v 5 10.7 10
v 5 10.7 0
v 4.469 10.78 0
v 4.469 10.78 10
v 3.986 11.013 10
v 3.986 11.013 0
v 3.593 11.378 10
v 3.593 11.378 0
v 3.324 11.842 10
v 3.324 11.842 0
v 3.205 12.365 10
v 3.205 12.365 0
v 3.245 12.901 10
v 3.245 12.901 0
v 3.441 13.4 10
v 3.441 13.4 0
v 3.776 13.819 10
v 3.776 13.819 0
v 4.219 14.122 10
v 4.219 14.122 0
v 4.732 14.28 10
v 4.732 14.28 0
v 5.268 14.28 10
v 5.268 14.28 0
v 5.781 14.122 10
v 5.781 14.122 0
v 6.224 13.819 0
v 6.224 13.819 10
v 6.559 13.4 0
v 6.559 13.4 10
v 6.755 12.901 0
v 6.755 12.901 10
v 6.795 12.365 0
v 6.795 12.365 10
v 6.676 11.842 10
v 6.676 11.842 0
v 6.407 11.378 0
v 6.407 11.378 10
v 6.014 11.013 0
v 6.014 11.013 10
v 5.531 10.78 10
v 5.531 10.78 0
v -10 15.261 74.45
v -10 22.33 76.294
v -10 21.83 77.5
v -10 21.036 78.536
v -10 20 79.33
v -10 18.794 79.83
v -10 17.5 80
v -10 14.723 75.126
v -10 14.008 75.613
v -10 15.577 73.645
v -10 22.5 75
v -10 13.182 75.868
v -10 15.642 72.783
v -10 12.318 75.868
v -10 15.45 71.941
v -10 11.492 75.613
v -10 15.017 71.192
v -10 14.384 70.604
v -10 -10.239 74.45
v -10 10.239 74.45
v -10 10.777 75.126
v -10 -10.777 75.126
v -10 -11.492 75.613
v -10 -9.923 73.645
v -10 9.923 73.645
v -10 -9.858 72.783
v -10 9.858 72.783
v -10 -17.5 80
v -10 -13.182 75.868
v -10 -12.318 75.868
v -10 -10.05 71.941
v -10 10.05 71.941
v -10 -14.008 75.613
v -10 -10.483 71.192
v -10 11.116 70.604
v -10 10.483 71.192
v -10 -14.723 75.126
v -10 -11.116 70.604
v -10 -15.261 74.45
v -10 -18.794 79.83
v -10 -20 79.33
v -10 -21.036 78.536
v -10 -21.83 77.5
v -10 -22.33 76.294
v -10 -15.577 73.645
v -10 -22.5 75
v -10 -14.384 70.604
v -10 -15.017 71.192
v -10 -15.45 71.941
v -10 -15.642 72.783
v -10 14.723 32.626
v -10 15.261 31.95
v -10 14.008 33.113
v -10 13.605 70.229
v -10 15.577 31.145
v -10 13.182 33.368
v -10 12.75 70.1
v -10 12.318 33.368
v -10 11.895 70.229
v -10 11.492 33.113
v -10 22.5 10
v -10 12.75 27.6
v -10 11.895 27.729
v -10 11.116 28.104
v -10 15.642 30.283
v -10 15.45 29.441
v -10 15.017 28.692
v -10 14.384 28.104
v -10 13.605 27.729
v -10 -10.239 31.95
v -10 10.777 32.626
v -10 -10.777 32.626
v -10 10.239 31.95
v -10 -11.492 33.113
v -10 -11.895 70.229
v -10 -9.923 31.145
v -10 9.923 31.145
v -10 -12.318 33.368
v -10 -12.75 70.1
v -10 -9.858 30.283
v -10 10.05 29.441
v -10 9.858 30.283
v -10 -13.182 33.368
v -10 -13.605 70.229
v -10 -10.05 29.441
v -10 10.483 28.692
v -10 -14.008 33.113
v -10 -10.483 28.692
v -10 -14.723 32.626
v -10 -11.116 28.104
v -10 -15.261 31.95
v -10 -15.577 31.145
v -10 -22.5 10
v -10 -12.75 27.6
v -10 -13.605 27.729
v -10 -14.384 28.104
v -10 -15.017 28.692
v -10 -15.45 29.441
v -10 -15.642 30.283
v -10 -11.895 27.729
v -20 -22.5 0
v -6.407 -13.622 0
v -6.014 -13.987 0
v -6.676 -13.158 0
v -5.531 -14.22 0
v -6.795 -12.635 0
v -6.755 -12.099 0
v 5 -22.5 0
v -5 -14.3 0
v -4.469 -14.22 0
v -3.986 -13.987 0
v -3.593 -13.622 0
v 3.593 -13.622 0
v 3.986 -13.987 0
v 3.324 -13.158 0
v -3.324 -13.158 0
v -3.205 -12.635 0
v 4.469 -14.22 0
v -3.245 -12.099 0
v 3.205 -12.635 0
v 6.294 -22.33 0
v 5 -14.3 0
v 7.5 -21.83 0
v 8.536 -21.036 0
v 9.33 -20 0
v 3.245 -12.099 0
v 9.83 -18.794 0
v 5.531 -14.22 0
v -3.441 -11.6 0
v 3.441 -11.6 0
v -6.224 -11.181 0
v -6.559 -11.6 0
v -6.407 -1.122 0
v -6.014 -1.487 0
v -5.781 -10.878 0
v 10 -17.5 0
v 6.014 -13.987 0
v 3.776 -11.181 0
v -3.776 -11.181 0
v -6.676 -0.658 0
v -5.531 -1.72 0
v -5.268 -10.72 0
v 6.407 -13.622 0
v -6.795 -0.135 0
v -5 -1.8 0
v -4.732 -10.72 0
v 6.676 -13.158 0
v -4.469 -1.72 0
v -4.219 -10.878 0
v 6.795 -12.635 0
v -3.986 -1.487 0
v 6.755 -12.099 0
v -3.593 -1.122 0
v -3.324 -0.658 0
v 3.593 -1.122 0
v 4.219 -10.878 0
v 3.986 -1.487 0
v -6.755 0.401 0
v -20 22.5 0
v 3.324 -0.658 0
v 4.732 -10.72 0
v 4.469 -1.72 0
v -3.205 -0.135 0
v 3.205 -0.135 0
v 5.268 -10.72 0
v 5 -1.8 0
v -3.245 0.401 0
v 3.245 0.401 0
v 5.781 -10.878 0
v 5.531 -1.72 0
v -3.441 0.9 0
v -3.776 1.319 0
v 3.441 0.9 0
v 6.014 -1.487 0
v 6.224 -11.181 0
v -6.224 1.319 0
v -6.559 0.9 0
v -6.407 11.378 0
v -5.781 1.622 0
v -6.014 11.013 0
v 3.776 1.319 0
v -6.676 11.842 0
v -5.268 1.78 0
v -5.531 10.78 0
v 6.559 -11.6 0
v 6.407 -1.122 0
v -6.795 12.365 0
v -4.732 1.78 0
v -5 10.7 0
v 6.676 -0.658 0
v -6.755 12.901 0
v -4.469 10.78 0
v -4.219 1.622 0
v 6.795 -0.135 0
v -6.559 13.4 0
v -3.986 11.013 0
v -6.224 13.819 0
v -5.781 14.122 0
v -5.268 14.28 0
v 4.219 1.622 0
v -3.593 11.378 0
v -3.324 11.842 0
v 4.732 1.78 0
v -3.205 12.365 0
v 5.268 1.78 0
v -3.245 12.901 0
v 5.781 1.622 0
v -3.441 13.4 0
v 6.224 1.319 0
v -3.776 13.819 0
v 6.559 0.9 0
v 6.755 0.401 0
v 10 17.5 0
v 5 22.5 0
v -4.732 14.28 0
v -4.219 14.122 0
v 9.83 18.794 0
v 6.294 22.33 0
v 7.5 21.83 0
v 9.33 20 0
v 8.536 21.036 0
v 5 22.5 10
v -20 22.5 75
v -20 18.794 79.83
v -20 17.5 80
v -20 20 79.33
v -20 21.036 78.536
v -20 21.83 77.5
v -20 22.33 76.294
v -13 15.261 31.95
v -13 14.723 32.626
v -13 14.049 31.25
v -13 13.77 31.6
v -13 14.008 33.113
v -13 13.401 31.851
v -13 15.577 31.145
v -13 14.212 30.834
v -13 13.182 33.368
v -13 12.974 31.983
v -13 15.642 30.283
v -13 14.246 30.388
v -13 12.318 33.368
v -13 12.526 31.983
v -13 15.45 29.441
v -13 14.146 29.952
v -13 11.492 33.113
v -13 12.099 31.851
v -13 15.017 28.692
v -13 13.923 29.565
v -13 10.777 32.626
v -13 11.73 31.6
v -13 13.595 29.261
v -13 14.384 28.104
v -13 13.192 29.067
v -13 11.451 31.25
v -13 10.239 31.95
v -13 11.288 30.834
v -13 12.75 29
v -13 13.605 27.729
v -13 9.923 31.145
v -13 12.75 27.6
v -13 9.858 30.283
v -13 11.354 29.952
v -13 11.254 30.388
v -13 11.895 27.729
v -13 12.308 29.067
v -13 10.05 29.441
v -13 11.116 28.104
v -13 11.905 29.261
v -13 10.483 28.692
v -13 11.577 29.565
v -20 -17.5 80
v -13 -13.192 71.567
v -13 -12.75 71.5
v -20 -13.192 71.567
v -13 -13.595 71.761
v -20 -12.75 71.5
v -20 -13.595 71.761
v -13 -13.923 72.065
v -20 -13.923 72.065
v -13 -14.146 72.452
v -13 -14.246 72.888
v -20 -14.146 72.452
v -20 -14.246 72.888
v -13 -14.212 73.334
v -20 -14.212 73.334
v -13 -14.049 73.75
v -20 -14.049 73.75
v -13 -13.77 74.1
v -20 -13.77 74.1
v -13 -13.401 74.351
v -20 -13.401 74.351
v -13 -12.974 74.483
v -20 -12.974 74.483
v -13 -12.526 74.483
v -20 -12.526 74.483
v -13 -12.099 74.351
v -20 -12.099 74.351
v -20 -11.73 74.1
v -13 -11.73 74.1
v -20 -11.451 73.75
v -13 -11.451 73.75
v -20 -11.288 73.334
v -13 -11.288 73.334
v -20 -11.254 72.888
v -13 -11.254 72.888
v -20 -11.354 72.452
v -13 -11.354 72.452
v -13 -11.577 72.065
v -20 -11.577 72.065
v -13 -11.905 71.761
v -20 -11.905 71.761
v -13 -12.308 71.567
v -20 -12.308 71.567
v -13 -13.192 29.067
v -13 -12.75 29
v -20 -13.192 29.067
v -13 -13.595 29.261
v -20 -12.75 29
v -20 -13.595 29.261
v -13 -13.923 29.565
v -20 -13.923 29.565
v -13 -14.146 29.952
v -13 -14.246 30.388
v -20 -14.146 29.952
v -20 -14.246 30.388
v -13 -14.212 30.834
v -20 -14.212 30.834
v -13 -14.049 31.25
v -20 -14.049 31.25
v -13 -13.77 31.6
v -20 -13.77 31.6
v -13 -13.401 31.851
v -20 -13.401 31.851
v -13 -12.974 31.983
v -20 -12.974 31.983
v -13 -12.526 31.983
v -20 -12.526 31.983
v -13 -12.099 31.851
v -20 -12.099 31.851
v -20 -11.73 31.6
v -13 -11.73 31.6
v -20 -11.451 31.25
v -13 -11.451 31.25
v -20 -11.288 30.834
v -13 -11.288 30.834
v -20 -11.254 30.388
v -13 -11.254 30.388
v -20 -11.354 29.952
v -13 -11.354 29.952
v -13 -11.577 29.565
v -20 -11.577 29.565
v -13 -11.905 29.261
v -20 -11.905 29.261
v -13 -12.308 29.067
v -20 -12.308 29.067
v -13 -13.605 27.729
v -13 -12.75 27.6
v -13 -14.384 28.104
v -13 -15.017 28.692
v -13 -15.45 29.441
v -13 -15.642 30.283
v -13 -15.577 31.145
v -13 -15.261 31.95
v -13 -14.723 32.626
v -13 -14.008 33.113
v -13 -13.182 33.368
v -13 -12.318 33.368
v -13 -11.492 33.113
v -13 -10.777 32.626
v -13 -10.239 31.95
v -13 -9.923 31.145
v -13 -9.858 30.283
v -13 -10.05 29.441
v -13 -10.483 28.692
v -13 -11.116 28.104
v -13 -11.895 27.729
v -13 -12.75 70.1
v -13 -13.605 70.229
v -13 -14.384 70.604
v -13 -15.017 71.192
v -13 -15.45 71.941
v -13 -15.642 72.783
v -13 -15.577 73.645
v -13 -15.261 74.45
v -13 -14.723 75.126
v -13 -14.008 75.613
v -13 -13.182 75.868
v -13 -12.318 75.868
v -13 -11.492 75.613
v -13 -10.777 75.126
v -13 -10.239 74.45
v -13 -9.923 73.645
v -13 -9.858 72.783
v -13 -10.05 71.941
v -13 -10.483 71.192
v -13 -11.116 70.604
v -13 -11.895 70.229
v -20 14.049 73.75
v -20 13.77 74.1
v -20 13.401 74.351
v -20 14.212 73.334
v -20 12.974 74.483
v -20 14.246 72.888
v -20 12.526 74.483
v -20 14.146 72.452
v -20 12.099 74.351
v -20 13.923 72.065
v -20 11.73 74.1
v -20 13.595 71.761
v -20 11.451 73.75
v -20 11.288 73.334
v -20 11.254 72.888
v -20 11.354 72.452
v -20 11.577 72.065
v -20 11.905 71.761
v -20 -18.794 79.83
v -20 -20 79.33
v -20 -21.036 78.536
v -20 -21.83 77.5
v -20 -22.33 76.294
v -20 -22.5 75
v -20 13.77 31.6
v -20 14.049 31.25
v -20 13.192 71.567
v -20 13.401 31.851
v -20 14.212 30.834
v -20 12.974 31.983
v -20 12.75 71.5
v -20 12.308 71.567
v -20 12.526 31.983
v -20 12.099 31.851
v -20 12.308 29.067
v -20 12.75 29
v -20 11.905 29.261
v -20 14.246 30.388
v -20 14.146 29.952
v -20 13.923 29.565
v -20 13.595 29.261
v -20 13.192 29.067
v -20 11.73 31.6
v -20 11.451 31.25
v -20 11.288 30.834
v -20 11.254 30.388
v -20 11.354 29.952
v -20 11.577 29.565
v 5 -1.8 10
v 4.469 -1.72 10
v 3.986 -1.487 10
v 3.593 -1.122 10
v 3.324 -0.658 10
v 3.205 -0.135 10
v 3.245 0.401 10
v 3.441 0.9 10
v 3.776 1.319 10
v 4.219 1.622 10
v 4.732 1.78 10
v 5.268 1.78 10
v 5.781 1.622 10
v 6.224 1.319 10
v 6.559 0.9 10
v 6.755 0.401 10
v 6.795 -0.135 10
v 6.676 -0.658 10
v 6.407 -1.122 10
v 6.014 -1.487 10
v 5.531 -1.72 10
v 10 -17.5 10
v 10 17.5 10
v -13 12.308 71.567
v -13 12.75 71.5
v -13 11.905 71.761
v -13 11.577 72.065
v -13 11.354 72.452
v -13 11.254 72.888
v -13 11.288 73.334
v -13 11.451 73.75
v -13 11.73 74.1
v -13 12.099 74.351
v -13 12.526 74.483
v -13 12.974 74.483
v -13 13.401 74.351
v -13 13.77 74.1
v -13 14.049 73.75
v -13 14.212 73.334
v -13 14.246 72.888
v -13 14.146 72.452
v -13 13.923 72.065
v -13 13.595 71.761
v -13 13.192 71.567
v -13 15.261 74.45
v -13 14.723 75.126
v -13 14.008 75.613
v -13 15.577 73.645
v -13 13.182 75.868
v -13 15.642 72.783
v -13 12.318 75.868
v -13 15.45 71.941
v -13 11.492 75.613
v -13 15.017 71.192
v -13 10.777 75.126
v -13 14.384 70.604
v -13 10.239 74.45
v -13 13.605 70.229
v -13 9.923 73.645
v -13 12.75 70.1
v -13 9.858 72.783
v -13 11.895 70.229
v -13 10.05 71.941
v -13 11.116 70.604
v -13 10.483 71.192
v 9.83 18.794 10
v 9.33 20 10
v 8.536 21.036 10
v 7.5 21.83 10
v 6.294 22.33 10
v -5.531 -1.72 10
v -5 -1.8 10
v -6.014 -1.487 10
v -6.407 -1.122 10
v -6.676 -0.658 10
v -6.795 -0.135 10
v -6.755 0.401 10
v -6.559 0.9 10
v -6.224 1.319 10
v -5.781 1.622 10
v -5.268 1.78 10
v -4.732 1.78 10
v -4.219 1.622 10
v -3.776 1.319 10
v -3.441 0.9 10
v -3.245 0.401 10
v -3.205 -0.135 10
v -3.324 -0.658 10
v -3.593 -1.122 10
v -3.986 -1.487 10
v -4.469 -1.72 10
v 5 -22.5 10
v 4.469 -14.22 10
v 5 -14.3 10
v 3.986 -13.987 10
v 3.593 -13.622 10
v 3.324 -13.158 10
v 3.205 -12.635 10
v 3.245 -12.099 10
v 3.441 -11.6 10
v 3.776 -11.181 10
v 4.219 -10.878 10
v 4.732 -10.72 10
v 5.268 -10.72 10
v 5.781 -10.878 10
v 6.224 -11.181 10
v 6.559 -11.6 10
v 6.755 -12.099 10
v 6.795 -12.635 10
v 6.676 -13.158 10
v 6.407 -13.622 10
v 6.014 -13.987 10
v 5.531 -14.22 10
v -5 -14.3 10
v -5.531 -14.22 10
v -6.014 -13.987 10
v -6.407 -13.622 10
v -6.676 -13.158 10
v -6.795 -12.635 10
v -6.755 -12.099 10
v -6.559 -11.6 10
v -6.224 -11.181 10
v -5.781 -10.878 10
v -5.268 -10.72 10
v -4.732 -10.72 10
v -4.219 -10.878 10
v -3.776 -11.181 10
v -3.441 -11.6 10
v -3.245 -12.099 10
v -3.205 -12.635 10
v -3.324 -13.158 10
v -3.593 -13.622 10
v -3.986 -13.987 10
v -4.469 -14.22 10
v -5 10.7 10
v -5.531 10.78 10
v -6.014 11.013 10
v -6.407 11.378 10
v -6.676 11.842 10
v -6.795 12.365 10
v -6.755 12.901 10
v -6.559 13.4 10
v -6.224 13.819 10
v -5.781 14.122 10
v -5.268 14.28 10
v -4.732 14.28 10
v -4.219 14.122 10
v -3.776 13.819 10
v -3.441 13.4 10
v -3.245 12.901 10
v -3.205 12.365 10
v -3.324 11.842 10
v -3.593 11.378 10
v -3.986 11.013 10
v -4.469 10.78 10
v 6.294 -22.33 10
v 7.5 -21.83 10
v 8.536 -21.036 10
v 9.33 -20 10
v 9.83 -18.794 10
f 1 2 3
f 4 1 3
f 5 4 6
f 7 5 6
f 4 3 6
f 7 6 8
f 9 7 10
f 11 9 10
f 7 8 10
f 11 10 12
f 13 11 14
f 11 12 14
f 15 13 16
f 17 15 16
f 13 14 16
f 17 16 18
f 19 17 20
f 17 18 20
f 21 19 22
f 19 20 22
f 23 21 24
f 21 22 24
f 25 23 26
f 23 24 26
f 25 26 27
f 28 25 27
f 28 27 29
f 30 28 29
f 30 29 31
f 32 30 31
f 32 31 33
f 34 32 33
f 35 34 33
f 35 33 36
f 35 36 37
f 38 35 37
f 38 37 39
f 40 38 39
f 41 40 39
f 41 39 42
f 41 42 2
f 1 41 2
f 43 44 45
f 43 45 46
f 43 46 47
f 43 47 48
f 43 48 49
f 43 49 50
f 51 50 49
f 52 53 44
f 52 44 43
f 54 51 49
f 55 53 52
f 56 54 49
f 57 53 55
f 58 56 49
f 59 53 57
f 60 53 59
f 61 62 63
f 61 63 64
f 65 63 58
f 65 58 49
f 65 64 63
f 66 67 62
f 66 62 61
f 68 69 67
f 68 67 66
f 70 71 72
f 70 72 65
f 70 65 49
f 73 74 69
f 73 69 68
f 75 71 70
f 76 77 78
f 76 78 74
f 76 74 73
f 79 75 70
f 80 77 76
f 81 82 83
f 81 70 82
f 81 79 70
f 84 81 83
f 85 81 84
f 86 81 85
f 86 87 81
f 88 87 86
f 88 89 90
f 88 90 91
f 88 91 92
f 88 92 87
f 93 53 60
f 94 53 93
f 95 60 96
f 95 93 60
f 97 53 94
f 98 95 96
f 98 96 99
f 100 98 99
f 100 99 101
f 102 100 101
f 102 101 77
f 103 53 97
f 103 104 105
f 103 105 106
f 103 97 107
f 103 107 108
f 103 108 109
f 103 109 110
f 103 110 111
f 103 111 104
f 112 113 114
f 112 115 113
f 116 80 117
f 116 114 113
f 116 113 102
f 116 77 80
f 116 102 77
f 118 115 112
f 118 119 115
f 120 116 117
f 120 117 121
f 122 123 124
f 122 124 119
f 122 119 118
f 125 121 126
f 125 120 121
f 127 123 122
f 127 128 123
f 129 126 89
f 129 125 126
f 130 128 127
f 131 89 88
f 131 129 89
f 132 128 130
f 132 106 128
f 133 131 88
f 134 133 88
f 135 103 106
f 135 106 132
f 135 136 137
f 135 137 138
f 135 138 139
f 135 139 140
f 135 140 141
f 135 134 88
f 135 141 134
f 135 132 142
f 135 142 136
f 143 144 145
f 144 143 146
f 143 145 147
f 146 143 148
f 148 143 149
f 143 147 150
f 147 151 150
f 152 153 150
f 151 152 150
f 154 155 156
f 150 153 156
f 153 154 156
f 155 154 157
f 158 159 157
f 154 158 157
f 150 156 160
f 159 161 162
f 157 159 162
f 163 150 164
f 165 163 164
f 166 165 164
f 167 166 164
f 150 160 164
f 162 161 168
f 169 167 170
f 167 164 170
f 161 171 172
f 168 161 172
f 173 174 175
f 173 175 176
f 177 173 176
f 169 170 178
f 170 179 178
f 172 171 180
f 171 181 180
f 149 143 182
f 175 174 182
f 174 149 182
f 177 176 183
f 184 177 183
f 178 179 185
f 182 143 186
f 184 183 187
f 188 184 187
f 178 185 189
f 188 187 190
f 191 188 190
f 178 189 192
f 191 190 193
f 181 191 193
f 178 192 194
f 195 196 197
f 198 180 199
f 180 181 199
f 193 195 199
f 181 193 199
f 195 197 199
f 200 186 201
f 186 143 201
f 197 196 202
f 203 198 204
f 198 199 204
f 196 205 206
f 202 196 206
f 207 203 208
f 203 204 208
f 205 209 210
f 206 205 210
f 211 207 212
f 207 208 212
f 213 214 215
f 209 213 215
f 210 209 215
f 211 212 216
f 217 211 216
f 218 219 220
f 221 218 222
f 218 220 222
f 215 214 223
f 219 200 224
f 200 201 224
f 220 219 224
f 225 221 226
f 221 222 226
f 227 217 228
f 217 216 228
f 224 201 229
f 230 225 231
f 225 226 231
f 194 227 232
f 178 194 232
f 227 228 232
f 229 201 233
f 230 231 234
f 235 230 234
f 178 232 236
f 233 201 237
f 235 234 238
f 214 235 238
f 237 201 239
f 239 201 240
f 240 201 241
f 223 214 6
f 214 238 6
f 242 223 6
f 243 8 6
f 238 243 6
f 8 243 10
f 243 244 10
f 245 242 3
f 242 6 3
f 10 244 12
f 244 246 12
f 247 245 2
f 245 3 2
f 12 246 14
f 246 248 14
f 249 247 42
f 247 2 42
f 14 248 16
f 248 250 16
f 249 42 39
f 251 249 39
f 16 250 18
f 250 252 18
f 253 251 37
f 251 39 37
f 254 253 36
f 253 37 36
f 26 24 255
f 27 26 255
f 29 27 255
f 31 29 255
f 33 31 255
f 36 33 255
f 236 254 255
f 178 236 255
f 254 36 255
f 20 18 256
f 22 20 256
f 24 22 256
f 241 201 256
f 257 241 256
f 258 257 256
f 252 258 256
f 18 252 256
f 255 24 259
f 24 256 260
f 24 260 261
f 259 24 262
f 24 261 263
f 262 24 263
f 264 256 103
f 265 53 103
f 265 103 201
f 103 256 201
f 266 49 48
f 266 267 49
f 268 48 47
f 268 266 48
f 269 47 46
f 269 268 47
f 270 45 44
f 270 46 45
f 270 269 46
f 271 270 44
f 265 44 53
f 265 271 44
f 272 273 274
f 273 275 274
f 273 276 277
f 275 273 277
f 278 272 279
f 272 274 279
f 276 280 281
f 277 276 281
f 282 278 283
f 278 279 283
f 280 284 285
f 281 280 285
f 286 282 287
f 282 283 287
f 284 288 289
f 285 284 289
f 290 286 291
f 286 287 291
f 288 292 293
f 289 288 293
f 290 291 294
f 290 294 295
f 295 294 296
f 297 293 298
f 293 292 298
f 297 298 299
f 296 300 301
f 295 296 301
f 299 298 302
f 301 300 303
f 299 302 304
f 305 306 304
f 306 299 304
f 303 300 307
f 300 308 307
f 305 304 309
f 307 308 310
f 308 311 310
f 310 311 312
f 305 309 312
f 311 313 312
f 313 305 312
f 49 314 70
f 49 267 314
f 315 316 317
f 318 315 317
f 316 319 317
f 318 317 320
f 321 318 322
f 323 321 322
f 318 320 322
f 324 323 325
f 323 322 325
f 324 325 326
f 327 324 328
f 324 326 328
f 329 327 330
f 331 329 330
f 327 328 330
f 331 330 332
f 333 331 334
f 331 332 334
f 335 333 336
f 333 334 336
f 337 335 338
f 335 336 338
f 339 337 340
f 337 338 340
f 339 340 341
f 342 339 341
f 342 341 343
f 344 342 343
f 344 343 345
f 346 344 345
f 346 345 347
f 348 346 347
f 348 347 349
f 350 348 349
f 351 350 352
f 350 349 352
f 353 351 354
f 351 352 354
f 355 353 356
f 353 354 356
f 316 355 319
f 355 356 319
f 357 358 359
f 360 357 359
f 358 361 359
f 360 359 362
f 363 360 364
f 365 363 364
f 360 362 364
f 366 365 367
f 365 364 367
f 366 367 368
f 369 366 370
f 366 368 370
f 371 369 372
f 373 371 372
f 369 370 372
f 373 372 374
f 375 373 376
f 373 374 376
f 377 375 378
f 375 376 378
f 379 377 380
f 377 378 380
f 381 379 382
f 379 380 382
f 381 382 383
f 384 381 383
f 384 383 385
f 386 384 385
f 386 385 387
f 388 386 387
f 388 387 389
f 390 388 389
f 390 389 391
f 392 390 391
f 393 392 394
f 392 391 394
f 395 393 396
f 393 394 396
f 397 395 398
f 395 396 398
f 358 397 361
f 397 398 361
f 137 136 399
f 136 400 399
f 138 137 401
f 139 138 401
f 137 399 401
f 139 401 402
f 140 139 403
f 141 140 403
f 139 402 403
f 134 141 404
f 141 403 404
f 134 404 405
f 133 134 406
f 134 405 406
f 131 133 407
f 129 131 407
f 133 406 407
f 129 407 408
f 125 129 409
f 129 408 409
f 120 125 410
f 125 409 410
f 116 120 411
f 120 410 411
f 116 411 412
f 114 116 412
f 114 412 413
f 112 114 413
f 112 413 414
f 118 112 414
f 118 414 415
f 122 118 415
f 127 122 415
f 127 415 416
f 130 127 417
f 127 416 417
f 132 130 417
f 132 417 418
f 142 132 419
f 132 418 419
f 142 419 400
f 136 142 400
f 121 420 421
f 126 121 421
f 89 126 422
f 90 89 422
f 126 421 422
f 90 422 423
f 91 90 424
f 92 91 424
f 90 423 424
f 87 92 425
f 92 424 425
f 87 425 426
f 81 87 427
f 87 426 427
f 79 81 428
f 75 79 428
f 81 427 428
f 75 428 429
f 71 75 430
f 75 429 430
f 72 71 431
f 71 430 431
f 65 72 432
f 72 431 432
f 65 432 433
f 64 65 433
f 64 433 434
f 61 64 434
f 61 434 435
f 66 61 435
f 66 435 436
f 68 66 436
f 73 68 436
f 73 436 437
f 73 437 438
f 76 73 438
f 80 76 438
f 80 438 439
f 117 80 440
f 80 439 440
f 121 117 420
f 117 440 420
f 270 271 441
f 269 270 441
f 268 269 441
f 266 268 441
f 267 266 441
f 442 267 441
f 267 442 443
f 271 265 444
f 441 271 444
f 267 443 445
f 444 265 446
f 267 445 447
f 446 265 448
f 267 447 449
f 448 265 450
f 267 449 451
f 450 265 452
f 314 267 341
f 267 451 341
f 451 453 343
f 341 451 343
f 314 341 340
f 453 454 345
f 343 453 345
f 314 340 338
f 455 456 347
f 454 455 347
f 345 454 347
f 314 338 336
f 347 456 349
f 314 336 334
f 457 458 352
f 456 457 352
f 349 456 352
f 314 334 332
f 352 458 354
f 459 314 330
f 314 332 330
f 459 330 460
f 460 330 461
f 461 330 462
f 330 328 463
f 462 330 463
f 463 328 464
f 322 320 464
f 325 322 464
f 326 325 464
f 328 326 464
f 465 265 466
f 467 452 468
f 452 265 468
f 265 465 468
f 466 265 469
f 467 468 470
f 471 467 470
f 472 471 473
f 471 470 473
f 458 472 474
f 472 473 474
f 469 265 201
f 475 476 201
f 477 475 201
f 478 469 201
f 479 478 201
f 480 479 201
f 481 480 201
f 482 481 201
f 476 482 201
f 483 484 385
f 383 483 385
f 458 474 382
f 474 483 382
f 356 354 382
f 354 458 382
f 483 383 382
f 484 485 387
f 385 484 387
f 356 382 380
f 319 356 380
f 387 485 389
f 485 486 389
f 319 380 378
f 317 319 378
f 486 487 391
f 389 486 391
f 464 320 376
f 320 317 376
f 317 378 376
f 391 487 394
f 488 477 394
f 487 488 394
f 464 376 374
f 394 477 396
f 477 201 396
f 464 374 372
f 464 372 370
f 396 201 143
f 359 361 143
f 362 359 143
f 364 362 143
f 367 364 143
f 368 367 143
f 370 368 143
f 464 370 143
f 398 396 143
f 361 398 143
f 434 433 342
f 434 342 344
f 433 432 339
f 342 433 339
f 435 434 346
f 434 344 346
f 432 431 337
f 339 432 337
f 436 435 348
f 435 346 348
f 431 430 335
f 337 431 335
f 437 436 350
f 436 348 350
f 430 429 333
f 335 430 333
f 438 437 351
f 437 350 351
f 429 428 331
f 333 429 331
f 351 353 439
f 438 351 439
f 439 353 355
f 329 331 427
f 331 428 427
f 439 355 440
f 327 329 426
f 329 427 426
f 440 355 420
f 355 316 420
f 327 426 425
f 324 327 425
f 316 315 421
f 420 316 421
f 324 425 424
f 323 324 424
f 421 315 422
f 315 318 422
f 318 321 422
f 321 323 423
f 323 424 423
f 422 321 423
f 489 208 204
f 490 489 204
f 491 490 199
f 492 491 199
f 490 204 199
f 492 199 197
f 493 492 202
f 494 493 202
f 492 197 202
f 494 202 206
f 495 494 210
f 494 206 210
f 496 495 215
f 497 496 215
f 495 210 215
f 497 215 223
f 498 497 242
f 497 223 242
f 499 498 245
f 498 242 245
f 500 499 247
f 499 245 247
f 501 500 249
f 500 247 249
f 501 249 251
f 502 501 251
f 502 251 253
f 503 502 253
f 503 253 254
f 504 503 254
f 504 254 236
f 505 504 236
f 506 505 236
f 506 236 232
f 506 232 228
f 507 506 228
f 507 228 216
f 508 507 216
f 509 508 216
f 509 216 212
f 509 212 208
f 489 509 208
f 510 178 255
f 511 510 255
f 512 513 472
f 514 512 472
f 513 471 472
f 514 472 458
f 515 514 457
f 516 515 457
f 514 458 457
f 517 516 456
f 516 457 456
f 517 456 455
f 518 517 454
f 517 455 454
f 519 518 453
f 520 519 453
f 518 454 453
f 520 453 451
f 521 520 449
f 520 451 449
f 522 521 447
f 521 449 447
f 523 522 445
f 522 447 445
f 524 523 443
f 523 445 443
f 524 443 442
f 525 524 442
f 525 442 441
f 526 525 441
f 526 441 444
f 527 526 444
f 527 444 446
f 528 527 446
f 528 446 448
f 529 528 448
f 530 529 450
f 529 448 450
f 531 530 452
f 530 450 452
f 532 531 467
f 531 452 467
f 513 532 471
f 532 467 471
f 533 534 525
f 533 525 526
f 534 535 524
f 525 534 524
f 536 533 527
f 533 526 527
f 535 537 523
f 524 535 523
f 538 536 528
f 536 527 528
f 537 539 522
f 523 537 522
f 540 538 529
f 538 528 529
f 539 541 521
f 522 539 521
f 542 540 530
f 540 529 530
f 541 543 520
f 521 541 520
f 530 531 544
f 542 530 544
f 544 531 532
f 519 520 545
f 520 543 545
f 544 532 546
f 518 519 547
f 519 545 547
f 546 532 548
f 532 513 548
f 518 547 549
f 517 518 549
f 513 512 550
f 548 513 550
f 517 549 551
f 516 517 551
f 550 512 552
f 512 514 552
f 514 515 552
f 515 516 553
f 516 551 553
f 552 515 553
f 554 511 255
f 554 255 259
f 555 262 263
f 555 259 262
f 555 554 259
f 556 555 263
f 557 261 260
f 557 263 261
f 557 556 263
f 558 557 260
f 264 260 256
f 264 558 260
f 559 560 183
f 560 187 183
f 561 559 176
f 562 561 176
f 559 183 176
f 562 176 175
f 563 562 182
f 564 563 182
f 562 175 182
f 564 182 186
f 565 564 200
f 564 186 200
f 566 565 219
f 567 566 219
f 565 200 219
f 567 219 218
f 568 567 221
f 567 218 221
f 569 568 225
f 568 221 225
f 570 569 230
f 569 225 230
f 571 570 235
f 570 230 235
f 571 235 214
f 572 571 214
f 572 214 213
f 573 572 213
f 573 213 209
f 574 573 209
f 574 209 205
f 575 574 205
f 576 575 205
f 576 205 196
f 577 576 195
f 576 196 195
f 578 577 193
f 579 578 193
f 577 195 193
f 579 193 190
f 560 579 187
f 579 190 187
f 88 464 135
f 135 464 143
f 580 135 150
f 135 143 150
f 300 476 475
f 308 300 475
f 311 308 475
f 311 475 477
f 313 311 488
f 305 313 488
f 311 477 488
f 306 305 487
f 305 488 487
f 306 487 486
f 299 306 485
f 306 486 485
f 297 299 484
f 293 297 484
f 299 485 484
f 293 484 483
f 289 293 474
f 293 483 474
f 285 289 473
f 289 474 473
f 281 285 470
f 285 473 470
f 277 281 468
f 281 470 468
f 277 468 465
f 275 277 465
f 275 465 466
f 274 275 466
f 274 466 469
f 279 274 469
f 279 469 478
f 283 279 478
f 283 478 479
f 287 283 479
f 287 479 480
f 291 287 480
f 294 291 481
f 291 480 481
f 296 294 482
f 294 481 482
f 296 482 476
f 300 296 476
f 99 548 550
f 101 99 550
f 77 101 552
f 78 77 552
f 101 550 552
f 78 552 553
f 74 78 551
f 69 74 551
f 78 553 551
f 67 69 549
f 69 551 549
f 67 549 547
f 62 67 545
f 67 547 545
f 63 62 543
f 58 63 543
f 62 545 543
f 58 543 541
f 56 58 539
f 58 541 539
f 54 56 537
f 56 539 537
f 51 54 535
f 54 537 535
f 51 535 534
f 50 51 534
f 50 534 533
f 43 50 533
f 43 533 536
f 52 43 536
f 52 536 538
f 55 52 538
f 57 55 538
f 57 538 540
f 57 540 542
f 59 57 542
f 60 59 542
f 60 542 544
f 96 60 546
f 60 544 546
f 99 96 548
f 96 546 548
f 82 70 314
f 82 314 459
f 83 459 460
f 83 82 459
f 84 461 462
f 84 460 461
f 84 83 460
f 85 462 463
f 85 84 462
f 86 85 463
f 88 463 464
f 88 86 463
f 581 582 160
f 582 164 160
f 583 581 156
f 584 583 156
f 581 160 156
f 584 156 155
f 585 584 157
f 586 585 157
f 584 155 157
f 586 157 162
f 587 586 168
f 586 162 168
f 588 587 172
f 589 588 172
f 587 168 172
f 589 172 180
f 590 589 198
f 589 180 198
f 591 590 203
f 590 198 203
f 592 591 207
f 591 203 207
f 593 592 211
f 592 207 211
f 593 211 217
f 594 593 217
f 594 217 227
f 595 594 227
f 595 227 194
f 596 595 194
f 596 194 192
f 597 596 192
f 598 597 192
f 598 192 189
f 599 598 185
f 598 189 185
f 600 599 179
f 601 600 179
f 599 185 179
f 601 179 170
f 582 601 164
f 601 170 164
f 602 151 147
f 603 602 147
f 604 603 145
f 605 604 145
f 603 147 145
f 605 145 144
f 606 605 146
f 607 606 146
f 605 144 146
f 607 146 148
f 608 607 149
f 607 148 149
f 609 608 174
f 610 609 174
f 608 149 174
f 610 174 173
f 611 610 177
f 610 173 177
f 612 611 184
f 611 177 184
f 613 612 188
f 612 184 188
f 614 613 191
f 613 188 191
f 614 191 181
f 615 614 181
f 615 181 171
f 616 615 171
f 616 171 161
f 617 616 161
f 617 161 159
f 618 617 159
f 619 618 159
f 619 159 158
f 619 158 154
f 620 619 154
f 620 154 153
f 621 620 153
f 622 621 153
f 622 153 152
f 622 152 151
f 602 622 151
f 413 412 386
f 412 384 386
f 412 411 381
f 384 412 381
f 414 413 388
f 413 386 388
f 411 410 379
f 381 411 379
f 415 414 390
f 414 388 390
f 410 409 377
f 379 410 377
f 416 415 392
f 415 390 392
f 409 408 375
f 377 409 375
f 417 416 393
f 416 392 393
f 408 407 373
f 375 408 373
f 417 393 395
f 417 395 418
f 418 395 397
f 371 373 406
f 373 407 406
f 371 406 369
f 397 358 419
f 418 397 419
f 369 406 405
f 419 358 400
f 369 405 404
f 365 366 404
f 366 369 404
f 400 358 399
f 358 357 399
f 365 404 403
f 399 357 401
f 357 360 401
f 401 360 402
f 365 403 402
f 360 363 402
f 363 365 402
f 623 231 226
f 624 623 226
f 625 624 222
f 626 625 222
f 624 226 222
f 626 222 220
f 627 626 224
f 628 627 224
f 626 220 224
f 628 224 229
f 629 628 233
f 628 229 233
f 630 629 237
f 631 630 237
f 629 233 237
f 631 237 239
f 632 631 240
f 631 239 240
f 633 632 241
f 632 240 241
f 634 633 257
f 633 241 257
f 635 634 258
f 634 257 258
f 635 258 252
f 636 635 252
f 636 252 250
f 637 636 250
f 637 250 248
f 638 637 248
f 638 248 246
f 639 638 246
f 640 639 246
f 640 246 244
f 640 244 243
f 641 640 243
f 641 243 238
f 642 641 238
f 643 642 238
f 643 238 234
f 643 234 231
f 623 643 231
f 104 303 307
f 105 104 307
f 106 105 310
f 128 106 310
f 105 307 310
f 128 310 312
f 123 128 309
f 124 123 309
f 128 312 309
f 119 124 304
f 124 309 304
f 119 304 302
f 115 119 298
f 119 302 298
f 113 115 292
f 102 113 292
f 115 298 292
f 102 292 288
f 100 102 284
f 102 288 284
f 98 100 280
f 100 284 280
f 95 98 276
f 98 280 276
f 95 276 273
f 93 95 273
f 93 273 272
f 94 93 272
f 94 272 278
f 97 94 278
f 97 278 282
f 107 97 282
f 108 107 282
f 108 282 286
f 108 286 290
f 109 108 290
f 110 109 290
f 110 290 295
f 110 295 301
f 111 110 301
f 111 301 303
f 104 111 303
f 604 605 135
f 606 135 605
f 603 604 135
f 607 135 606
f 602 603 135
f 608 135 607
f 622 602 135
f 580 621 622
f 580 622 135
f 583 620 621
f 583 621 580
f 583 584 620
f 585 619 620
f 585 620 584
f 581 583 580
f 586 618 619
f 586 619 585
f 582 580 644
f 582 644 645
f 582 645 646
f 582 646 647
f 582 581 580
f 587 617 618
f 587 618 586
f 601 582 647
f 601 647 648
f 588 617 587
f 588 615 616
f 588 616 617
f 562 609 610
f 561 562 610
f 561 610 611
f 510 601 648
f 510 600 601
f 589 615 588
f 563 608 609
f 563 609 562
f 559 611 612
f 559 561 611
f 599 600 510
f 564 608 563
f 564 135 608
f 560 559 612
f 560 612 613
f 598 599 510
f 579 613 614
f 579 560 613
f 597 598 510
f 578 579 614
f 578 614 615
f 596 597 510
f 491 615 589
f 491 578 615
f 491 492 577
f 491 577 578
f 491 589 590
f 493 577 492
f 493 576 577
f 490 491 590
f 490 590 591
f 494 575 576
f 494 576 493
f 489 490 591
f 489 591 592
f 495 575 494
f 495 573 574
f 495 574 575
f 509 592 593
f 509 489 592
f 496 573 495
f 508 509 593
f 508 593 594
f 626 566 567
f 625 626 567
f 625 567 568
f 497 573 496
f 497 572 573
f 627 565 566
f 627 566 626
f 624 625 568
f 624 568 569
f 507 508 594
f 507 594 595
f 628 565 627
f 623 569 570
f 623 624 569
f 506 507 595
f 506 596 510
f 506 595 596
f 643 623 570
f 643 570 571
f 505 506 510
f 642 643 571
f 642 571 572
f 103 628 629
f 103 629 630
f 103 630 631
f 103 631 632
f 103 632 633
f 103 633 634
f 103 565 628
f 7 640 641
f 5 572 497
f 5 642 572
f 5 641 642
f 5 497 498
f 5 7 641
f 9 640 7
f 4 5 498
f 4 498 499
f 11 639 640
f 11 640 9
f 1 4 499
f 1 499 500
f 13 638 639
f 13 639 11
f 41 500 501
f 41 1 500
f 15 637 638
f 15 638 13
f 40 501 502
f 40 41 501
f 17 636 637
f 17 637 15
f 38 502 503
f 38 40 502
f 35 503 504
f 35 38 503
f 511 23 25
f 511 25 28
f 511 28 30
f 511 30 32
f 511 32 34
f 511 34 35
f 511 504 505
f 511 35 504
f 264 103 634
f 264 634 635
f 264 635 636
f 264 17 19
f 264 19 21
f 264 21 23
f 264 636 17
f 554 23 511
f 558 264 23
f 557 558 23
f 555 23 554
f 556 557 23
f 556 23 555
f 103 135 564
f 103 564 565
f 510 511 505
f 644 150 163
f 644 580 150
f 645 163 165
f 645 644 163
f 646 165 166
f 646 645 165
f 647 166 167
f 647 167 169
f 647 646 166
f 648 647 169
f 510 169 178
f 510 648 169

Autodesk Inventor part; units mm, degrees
ref_plane "YZ Plane" through (0, 0, 0) normal (1, 0, 0) x (0, 1, 0)
ref_plane "XZ Plane" through (0, 0, 0) normal (0, 1, 0) x (-1, 0, 0)
ref_plane "XY Plane" through (0, 0, 0) normal (0, 0, 1) x (1, 0, 0)
sketch "Sketch1" plane through (0, 0, 0) normal (0, 0, 1) x (1, 0, 0)
  line L0 (-10, -22.5) -> (10, -22.5)
  line L1 (10, -22.5) -> (10, 22.5)
  line L2 (10, 22.5) -> (-10, 22.5)
  line L3 (-10, 22.5) -> (-10, -22.5)
  line L4 (-10, -22.5) -> (10, 22.5) construction
  line L5 (10, -22.5) -> (-10, 22.5) construction
  line L6 (-10, 22.5) -> (-20, 22.5)
  line L7 (-20, 22.5) -> (-20, -22.5)
  line L8 (-20, -22.5) -> (-10, -22.5)
  line L9 (-10, -22.5) -> (-10, 22.5)
  point P0 (0, 0)
  dimension "d0" = 20
  dimension "d1" = 45
  dimension "d2" = 10
extrude "Extrusion1" add sketch "Sketch1" along normal blind 10 contours L3 L2 L1 L0
sketch "Sketch2" plane through (0, 0, 10) normal (0, 0, 1) x (1, 0, 0)
  line L0 (5, -12.5) -> (-5, -12.5) construction
  line L1 (-5, -12.5) -> (-5, 12.5) construction
  line L2 (-5, 12.5) -> (5, 12.5) construction
  line L3 (5, 12.5) -> (5, -12.5) construction
  line L4 (5, -12.5) -> (-5, 12.5) construction
  line L5 (-5, -12.5) -> (5, 12.5) construction
  point P0 (0, 0)
  point P1 (-5, 0)
  point P2 (5, 0)
  dimension "d5" = 10
  dimension "d6" = 25
hole "Hole1" at (-5, 12.5, 10) at (5, 12.5, 10) at (5, -12.5, 10) at (-5, -12.5, 10) at (-5, 0, 10) at (5, 0, 10) direction (0, 0, -1) diameter 3.6 end through all clearance for "Countersunk Flat Head Screw DIN EN ISO 2009" size "M3" standard "DIN"
sketch "Sketch3" plane through (0, 0, 0) normal (0, 0, 1) x (1, 0, 0)
  line L0 (-10, 22.5) -> (-10, -22.5) projected
  line L1 (-10, 22.5) -> (-20, 22.5)
  line L2 (-20, 22.5) -> (-20, -22.5)
  line L3 (-20, -22.5) -> (-10, -22.5)
  line L4 (-10, -22.5) -> (-10, 22.5)
  point P0 (0, 0)
  dimension "d14" = 10
extrude "Extrusion2" add sketch "Sketch3" along normal blind 80
sketch "Sketch4" plane through (-10, -22.5, 10) normal (1, 0, 0) x (0, 0, -1)
  line L0 (-63, 9.75) -> (-20.5, 9.75)
  line L1 (-20.5, 9.75) -> (-20.5, 35.25)
  line L2 (-20.5, 35.25) -> (-63, 35.25)
  line L3 (-63, 35.25) -> (-63, 9.75)
  line L4 (-63, 9.75) -> (-20.5, 35.25) construction
  line L5 (-20.5, 9.75) -> (-63, 35.25) construction
  line L6 (0, 0) -> (0, 45) projected
  line L7 (-70, 0) -> (-70, 45) projected
  line L8 (0, 45) -> (-70, 45) projected
  point P0 (10, 22.5)
  point P1 (-41.75, 22.5)
  point P2 (-70, 22.5)
  dimension "d17" = 42.5
  dimension "d18" = 25.5
  dimension "d19" = 7
hole "Hole2" at (-10, 12.75, 73) at (-10, -12.75, 73) at (-10, 12.75, 30.5) at (-10, -12.75, 30.5) direction (-1, 0, 0) diameter 3 end through all clearance for "Countersunk Flat Head Screw DIN EN ISO 2009" size "M2.5" standard "DIN"
sketch "Sketch5" plane through (-10, -22.5, 10) normal (1, 0, 0) x (0, 0, -1)
  circle A0 centre (-63, 35.25) radius 1.5 projected
  circle A1 centre (-20.5, 35.25) radius 1.5 projected
  circle A2 centre (-20.5, 9.75) radius 1.5 projected
  circle A3 centre (-63, 9.75) radius 1.5 projected
  point P0 (10, 22.5)
hole "Hole3" at (-10, 12.75, 73) at (-10, 12.75, 30.5) at (-10, -12.75, 30.5) at (-10, -12.75, 73) direction (-1, 0, 0) diameter 5.8 depth 3
fillet "Fillet1" radius 5 4 edges at (-15, 22.5, 80) (-15, -22.5, 80) (10, 22.5, 5) (10, -22.5, 5)
properties part number "Uchwyt_konwerter" material "PET Plastic"
